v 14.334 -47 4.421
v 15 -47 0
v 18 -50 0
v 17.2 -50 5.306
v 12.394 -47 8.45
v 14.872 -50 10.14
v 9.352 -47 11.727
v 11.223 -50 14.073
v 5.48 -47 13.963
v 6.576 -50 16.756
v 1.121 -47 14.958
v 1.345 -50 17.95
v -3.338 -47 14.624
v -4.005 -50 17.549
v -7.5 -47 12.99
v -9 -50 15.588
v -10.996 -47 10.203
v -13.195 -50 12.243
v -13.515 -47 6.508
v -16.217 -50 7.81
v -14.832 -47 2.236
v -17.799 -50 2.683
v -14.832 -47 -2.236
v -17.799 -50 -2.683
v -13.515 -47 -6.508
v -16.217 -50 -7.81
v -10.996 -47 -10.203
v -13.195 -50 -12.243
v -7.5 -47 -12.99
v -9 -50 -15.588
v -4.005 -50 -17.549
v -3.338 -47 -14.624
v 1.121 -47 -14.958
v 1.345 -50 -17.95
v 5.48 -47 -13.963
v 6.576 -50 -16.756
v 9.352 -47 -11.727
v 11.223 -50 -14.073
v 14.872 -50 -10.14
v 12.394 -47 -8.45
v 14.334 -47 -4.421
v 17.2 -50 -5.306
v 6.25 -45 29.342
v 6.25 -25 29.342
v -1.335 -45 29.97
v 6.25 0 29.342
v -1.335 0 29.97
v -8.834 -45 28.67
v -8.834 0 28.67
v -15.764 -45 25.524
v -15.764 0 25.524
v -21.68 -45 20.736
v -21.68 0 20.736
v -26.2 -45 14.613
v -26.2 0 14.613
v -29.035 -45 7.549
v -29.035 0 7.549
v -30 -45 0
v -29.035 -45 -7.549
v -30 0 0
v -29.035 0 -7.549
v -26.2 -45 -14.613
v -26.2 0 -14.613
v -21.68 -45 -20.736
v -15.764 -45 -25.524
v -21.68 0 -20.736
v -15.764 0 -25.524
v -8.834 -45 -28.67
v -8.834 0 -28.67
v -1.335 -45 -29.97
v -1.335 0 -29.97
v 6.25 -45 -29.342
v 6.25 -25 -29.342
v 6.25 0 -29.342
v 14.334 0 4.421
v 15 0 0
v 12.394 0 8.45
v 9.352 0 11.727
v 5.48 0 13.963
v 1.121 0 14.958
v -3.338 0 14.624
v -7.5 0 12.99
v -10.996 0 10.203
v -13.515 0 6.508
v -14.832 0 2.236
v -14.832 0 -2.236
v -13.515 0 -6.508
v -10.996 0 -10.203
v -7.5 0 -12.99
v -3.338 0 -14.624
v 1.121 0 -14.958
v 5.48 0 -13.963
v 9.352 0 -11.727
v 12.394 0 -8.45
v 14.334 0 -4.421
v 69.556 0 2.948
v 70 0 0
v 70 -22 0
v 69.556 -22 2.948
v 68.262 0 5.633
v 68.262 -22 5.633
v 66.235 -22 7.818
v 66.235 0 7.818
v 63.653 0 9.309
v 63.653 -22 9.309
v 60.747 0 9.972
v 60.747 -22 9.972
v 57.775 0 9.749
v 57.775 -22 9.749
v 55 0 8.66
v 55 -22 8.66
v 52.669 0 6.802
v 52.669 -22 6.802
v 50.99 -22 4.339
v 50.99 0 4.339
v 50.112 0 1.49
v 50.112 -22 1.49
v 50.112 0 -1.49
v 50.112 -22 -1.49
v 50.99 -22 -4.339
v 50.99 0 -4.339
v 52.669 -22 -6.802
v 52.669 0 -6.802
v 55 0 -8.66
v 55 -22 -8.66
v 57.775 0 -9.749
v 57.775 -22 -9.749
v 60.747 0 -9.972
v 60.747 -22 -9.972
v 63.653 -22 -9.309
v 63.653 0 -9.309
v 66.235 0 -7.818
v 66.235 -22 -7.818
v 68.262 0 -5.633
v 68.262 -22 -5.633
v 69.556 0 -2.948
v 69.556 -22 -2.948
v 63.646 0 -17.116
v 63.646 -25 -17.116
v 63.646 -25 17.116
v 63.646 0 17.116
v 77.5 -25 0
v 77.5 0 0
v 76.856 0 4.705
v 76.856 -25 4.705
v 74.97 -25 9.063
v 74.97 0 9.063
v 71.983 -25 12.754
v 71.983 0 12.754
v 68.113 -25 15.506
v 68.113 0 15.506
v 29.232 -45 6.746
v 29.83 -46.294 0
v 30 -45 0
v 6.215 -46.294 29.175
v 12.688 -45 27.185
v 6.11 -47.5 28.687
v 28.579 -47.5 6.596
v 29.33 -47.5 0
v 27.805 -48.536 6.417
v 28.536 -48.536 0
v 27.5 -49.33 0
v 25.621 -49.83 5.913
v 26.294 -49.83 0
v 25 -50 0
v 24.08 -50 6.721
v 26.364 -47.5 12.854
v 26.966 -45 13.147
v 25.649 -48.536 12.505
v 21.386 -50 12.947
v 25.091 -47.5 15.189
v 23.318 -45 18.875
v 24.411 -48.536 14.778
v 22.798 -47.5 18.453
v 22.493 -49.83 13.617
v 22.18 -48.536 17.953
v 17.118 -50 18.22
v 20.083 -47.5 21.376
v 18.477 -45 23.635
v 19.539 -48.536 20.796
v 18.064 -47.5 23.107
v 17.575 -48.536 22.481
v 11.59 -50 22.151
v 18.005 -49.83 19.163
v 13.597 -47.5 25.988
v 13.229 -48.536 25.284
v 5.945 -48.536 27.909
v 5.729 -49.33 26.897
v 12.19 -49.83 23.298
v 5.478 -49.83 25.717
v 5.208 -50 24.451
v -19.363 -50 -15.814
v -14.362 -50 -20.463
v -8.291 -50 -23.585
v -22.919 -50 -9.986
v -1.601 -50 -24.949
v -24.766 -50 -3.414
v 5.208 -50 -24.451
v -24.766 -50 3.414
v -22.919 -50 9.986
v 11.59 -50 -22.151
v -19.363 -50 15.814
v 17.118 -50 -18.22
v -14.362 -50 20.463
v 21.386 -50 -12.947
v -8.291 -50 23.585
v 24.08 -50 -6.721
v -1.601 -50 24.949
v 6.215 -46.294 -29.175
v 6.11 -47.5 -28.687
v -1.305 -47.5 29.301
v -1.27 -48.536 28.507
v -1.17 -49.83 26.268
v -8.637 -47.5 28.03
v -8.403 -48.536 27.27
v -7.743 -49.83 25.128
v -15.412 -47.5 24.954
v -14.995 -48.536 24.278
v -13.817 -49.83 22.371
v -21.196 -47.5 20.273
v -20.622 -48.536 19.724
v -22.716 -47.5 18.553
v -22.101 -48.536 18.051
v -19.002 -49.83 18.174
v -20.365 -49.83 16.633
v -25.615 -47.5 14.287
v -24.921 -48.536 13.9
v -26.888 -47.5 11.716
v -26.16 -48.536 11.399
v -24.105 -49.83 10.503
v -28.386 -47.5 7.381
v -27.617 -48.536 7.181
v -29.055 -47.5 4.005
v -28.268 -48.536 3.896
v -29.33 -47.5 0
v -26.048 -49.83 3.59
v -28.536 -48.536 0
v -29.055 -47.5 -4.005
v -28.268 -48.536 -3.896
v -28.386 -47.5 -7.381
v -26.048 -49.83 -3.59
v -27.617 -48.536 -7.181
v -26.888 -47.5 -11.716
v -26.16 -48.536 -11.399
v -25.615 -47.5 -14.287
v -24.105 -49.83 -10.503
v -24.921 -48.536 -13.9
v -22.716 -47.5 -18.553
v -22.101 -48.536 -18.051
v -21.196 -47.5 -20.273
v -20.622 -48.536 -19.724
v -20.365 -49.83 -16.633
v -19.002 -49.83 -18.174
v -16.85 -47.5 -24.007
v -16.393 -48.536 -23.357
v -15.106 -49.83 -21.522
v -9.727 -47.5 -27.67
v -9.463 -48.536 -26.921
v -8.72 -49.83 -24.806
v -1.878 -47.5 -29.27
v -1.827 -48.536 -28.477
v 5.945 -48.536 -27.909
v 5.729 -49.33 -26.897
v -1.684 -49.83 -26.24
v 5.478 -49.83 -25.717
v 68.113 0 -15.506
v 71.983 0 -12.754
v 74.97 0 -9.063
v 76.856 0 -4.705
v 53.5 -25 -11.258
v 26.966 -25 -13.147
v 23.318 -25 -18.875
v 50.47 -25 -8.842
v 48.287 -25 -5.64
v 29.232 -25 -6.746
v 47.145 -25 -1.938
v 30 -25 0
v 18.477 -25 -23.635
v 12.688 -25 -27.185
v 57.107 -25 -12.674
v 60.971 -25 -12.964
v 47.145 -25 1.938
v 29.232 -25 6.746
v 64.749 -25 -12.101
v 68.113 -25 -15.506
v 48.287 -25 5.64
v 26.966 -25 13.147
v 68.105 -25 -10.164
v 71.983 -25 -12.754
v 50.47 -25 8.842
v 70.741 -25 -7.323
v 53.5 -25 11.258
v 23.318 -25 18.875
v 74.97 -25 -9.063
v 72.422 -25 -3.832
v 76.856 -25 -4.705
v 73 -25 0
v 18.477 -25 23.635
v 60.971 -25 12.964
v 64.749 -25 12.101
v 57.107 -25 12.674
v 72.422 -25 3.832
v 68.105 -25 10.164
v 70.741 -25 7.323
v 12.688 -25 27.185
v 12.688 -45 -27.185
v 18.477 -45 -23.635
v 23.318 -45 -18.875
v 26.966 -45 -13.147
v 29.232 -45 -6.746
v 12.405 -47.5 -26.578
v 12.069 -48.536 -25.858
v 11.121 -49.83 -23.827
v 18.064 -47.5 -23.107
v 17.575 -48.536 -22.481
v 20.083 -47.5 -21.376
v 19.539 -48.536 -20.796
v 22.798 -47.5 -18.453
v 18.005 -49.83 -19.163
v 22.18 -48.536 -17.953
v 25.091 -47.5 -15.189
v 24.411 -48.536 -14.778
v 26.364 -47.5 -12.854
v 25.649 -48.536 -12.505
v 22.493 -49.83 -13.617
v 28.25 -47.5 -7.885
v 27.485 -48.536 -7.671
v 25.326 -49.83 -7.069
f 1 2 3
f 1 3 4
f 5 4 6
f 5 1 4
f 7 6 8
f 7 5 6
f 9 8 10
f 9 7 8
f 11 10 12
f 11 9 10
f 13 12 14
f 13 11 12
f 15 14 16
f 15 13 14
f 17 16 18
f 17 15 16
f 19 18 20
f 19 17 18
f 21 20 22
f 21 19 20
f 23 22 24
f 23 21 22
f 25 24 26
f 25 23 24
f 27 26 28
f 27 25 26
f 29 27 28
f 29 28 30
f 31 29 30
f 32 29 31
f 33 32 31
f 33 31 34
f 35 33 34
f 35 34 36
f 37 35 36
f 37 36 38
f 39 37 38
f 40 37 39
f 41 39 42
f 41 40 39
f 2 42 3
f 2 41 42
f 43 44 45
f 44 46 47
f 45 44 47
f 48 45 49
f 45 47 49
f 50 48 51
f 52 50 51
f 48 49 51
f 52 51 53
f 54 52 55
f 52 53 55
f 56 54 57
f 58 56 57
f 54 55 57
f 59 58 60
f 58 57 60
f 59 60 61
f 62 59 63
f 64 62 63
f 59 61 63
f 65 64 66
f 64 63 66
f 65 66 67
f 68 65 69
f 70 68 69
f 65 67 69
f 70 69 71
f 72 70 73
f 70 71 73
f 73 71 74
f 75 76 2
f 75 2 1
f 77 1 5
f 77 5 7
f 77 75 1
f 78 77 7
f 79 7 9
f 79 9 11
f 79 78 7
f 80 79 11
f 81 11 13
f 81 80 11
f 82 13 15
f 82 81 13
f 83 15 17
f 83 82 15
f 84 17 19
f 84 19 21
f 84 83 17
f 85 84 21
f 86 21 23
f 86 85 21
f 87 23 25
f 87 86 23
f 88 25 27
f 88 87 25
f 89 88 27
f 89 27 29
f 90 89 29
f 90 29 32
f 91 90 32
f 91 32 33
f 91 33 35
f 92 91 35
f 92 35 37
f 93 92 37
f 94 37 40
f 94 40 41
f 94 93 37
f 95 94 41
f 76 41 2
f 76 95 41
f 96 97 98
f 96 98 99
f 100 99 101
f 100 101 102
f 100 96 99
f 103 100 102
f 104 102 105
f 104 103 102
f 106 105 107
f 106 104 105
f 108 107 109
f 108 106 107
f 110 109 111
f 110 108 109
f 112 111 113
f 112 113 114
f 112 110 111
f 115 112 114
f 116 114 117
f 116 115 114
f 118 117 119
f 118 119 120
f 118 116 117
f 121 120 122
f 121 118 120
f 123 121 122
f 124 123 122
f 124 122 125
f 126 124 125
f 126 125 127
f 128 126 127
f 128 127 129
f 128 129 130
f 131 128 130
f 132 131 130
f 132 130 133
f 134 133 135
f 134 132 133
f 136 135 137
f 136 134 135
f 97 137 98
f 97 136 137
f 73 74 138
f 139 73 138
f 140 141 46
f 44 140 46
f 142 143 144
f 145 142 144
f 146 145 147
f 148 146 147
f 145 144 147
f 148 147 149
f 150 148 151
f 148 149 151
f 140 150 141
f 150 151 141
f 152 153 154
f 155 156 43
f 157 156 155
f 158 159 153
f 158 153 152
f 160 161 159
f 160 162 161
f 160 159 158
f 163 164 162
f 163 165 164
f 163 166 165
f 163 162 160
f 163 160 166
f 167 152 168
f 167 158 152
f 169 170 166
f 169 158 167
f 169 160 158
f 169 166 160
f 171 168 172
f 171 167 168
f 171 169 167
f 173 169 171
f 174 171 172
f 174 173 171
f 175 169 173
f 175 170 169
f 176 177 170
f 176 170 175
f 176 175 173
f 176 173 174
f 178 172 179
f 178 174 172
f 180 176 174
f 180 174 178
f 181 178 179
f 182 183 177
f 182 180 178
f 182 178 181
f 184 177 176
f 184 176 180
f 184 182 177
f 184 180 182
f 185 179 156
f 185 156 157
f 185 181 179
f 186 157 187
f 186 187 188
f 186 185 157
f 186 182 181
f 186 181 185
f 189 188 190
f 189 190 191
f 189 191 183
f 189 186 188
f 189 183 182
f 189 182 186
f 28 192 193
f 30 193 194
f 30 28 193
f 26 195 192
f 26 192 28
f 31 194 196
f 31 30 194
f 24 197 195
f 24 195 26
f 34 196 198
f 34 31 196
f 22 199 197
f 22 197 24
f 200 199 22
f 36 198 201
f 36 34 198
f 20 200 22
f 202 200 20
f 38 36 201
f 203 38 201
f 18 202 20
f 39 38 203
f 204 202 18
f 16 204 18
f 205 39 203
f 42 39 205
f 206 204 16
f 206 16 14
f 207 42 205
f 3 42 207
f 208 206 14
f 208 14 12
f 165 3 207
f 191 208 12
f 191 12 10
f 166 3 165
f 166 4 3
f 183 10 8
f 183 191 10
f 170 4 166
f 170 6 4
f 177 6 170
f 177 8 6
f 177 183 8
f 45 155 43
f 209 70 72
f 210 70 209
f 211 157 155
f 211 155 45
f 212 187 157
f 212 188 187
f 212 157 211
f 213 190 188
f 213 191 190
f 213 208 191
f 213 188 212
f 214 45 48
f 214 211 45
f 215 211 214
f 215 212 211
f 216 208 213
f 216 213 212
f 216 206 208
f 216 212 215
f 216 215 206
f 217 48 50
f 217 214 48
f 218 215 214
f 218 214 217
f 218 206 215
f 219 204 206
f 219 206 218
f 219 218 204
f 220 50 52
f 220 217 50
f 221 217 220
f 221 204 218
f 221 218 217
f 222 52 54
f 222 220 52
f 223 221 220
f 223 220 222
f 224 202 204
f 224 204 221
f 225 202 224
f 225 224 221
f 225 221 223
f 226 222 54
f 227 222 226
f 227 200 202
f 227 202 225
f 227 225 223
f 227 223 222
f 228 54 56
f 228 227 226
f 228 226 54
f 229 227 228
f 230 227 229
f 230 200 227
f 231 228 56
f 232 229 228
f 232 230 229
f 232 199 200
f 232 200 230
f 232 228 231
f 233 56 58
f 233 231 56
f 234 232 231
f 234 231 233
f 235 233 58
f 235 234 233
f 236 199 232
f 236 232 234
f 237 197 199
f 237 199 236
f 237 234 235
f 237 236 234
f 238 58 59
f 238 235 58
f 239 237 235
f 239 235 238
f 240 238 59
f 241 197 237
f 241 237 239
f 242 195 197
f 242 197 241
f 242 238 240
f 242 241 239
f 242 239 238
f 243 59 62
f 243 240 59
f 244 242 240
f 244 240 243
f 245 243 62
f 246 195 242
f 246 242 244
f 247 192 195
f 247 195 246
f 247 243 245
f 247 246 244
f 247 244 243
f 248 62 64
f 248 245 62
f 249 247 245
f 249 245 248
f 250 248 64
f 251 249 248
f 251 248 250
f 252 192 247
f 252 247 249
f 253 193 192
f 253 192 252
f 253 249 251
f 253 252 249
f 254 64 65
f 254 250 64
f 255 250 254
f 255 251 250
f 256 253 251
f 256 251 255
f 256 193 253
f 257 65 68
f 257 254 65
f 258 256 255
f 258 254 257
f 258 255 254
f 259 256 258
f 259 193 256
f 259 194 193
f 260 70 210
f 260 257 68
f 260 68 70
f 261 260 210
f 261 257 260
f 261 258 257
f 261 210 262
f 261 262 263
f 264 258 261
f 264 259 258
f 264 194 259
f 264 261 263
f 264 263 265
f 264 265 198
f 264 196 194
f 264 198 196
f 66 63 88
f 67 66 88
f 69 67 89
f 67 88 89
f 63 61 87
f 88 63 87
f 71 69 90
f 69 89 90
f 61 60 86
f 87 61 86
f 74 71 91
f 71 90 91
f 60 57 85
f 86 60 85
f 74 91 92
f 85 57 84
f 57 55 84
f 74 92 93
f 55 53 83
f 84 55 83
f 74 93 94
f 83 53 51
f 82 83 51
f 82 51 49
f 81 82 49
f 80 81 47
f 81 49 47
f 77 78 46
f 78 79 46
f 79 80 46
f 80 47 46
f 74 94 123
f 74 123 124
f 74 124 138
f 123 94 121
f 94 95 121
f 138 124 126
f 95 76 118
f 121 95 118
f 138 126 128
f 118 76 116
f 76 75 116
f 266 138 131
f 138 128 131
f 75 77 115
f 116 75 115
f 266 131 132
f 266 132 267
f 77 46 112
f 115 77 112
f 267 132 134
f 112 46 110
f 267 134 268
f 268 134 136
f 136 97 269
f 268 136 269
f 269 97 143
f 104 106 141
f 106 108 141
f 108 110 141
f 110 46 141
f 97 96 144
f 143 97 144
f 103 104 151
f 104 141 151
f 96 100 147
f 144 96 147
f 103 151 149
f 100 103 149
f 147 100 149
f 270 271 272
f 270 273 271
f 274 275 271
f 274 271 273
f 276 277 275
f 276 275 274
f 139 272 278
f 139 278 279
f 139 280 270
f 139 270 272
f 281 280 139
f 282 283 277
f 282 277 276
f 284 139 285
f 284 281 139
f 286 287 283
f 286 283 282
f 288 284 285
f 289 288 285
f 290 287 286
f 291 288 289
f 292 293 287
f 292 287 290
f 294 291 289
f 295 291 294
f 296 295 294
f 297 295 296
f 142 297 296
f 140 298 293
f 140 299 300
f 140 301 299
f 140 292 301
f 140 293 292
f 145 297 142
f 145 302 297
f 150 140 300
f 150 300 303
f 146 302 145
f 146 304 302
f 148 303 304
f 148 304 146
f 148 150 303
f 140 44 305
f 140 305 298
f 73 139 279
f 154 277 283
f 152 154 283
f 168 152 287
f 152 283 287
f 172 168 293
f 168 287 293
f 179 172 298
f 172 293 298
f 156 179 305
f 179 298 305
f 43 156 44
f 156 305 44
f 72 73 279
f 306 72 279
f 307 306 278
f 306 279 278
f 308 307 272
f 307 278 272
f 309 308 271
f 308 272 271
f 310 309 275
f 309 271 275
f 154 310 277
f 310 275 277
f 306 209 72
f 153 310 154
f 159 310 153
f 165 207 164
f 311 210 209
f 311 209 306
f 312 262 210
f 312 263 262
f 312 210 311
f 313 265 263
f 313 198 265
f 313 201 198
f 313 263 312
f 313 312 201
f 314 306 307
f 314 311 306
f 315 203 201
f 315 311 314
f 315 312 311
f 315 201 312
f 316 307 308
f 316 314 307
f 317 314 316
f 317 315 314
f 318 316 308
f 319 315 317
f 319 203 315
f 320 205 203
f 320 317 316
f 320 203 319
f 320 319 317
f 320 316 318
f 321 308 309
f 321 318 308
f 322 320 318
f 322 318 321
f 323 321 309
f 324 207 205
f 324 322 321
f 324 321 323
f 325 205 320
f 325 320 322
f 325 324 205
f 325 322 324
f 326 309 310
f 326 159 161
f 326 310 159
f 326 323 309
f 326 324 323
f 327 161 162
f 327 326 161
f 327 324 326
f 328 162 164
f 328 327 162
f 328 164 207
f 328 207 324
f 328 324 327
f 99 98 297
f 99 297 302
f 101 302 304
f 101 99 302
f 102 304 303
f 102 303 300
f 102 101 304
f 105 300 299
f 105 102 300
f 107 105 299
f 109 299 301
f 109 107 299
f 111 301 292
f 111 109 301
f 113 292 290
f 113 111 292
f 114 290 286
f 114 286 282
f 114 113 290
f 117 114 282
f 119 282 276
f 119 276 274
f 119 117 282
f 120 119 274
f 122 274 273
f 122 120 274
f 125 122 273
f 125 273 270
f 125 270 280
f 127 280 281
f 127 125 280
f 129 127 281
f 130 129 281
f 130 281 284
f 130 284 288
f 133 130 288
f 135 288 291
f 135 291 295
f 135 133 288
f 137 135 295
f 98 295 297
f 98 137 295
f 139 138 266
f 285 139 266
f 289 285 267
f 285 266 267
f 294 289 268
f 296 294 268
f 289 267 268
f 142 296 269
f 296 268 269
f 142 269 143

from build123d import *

# Parameters (mm, degrees)
F0_R     = 15
F0_R_2   = 10
F1_DEPTH = 25
F2_DEPTH = 50
F3_R     = 5
F4_SIZE  = 3


with BuildPart() as f1:
    # F0 (on Front) → F1 (new body)
    with BuildSketch(Plane.XZ):
        with BuildLine():
            ThreePointArc((6.25, -29.341736), (23.318448, -18.874586), (30, 0))
            ThreePointArc((30, 0), (23.318448, 18.874586), (6.25, 29.341736))
            ThreePointArc((6.25, 29.341736), (-30, 0), (6.25, -29.341736))
        make_face()
        Circle(F0_R, mode=Mode.SUBTRACT)
        with BuildLine():
            ThreePointArc((6.25, 29.341736), (23.318448, 18.874586), (30, 0))
            ThreePointArc((30, 0), (23.318448, -18.874586), (6.25, -29.341736))
            Line((6.25, -29.341736), (63.645833, -17.116013))
            ThreePointArc((63.645833, -17.116013), (42.5, 0), (63.645833, 17.116013))
            Line((63.645833, 17.116013), (6.25, 29.341736))
        make_face()
        with BuildLine():
            ThreePointArc((77.5, 0), (73.602428, 11.010175), (63.645833, 17.116013))
            ThreePointArc((63.645833, 17.116013), (42.5, 0), (63.645833, -17.116013))
            ThreePointArc((63.645833, -17.116013), (73.602428, -11.010175), (77.5, 0))
        make_face()
        with Locations((60, 0)):
            Circle(F0_R_2, mode=Mode.SUBTRACT)
    extrude(amount=F1_DEPTH)

    # F0 (on Front) → F2 (join)
    with BuildSketch(Plane.XZ):
        with BuildLine():
            ThreePointArc((6.25, -29.341736), (23.318448, -18.874586), (30, 0))
            ThreePointArc((30, 0), (23.318448, 18.874586), (6.25, 29.341736))
            ThreePointArc((6.25, 29.341736), (-30, 0), (6.25, -29.341736))
        make_face()
        Circle(F0_R, mode=Mode.SUBTRACT)
    extrude(amount=F2_DEPTH)

    # F3
    f3_edges = [f1.edges().sort_by_distance(p)[0] for p in [
        (-6.25, -50, 29.341736),
    ]]
    fillet(f3_edges, radius=F3_R)

    # F4
    f4_edges = [f1.edges().sort_by_distance(p)[0] for p in [
        (-15, -50, 0),
        (50, -25, 0),
    ]]
    chamfer(f4_edges, length=F4_SIZE)


solid = f1.part
